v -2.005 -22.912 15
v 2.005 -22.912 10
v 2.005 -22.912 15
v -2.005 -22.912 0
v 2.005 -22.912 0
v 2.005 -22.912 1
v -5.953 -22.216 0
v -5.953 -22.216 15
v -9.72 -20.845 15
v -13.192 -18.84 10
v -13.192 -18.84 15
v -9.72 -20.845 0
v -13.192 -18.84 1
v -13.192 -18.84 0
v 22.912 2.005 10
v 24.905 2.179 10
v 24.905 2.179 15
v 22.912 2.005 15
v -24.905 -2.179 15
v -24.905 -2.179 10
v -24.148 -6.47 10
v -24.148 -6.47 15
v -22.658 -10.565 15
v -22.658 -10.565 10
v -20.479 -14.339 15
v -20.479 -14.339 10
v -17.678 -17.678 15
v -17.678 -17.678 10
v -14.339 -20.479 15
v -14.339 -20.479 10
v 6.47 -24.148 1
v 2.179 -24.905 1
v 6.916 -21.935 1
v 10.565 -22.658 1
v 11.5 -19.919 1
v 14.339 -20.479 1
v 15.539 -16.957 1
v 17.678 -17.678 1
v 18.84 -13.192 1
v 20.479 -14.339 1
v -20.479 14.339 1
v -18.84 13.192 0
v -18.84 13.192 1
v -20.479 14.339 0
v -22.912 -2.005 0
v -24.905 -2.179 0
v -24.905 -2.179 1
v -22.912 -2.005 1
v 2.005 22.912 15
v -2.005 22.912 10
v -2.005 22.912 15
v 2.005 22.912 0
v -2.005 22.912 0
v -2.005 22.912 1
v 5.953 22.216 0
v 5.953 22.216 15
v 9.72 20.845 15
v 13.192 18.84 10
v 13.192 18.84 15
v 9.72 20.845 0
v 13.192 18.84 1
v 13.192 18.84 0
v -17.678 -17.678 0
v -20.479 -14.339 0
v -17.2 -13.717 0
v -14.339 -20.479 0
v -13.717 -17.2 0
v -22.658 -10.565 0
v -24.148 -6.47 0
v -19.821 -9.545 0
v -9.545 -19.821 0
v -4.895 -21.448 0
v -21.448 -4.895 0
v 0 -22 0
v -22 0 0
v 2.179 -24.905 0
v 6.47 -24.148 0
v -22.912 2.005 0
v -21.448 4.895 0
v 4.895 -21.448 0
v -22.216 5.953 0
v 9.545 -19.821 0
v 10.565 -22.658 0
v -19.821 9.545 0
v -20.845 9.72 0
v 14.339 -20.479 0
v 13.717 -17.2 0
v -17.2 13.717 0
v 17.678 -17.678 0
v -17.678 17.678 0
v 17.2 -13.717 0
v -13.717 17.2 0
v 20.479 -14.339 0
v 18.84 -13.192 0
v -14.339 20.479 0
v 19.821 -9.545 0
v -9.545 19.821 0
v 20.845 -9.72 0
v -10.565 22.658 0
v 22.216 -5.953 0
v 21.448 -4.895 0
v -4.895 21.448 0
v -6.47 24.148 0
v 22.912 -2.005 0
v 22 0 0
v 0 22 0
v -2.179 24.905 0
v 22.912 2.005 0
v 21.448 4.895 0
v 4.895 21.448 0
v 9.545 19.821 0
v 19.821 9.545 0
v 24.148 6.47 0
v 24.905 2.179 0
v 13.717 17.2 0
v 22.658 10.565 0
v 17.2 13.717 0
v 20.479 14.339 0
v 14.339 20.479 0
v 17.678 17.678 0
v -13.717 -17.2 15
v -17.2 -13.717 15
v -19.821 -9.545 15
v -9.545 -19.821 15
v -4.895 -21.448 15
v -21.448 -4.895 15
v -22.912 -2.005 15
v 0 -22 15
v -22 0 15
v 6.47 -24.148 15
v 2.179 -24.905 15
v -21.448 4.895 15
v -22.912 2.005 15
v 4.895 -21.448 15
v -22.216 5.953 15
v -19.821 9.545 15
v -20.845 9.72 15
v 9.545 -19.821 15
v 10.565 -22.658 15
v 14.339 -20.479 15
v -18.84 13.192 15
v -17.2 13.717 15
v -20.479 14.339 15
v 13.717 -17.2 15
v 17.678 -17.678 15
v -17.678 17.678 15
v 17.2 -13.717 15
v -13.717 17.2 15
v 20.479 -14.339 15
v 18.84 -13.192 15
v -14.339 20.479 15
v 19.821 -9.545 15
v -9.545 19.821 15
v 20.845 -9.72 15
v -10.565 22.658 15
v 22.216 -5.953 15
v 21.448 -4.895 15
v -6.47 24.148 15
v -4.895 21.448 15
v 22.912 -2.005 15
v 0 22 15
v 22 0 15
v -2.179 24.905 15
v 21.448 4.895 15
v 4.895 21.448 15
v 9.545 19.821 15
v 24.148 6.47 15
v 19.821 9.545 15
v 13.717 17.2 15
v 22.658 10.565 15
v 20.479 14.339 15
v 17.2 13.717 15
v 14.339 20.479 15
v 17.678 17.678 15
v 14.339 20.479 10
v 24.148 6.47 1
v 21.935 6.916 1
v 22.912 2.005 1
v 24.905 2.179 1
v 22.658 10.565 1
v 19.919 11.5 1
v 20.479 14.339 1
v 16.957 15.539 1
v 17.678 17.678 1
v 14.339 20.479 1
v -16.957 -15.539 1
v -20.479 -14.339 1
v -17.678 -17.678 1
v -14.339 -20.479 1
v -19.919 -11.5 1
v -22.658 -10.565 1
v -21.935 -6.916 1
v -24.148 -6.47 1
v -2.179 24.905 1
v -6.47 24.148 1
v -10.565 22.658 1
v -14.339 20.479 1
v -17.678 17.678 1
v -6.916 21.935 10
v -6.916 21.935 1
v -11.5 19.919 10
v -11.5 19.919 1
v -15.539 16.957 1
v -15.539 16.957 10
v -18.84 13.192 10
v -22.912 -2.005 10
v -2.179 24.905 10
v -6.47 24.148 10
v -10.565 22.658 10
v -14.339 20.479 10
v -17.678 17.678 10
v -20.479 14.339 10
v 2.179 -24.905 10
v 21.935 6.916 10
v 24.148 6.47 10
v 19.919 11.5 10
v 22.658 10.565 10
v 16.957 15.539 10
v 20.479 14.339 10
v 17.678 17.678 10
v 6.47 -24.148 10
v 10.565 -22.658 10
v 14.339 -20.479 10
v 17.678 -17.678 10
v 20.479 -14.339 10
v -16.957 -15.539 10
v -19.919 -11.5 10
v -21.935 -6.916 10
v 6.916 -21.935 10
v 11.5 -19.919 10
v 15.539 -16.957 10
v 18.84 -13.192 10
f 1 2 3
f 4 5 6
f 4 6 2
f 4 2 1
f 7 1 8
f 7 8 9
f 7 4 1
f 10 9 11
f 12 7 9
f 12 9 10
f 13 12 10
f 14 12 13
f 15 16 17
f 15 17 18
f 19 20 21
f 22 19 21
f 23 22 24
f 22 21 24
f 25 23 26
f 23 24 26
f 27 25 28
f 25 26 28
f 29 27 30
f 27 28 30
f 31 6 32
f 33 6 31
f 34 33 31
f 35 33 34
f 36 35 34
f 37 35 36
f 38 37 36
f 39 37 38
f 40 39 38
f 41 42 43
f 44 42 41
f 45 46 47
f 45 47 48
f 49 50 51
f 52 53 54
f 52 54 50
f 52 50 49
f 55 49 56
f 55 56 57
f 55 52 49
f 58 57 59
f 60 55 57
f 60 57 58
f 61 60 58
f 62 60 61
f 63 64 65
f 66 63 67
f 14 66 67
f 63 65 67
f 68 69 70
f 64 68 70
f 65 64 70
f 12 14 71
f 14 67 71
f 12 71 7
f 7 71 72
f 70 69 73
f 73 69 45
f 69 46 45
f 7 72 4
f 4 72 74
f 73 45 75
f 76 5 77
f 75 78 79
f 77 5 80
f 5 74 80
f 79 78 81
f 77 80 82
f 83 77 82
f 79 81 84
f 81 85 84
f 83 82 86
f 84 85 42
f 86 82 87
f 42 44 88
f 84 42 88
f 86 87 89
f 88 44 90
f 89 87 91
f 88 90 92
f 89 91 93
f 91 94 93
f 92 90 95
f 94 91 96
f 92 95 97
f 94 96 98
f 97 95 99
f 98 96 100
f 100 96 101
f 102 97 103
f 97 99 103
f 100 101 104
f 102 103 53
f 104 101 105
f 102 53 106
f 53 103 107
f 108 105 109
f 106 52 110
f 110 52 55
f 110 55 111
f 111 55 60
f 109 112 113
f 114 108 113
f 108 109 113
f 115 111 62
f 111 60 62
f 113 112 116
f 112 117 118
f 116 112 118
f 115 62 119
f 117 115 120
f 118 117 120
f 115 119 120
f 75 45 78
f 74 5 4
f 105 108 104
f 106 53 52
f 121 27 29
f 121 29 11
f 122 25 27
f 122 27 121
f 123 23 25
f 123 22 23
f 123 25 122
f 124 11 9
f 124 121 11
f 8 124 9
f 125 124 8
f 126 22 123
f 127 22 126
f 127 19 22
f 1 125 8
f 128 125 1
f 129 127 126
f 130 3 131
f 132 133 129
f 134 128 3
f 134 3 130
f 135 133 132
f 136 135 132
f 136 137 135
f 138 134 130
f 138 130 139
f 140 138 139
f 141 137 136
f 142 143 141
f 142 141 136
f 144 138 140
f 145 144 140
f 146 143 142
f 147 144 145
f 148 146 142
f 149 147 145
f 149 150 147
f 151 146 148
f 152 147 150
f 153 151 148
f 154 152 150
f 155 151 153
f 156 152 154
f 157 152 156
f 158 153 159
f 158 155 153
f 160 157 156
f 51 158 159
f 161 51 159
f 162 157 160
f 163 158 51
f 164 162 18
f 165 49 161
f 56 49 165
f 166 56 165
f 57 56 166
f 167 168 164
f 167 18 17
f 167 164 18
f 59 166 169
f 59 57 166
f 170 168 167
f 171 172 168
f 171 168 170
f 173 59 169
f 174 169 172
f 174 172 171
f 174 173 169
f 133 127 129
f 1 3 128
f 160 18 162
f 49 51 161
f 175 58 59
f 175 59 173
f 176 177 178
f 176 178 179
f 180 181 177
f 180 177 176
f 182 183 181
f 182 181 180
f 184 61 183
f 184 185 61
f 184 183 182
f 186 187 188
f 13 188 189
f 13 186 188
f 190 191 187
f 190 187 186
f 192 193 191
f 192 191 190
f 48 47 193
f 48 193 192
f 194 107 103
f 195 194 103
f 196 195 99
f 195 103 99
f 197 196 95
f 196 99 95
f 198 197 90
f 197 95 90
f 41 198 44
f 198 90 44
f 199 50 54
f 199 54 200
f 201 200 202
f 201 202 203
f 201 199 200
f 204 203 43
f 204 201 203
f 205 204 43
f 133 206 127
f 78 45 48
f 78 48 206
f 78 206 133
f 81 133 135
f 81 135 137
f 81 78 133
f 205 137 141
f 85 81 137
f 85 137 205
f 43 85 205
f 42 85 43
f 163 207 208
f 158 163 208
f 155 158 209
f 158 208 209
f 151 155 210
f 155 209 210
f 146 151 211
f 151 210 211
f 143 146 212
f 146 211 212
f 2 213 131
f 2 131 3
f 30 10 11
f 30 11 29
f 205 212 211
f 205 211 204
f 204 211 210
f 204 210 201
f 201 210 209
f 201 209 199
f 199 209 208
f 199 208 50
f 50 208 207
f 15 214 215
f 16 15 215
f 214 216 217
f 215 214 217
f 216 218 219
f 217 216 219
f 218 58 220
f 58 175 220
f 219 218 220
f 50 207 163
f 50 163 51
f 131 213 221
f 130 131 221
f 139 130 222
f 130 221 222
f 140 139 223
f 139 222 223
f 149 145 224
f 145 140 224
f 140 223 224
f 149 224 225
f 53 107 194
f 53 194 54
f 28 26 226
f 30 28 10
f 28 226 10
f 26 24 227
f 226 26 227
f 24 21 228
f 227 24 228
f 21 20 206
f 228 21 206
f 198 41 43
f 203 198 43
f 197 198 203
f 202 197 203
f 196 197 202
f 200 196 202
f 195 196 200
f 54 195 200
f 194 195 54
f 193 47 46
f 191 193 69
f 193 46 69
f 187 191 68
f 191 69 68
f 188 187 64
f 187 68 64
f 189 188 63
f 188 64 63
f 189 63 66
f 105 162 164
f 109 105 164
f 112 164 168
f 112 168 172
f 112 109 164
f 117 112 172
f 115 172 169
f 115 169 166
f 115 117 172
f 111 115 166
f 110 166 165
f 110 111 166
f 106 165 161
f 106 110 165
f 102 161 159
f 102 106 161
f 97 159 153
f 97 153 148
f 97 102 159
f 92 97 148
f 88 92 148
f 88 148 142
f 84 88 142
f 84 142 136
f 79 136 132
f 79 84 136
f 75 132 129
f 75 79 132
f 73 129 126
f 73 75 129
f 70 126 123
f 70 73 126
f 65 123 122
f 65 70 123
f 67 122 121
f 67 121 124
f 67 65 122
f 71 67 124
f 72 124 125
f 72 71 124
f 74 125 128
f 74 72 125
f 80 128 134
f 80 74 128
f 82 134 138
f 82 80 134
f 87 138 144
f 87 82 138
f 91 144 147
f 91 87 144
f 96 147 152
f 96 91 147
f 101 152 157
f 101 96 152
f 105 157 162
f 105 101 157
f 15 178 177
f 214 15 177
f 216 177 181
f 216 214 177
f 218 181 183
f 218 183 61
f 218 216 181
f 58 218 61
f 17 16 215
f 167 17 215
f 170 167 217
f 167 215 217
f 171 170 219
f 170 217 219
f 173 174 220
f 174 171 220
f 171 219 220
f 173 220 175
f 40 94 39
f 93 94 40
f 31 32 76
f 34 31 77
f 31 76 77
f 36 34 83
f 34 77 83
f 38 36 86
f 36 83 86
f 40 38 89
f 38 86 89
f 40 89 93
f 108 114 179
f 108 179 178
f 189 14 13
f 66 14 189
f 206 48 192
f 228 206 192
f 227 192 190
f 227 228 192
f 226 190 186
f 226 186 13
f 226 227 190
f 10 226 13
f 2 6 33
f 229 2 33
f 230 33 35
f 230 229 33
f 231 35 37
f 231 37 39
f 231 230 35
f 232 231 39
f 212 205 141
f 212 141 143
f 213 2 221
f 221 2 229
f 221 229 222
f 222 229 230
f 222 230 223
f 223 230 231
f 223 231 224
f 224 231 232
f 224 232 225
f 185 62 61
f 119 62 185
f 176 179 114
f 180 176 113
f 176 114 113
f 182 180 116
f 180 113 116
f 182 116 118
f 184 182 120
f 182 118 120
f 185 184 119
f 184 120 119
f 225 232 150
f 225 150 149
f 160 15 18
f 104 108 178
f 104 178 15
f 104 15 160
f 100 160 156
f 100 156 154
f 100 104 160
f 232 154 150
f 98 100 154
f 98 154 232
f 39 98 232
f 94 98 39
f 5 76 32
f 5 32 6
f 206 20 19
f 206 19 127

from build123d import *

# Parameters (mm, degrees)
F0_R            = 25
F0_R_2          = 22
F1_DEPTH        = 15
F3_DEPTH        = 15
F3_COPIES_COUNT = 4
F5_R            = 38.565863123
F5_R_2          = 23
F6_DEPTH        = 2.5
F7_R            = 30.9780307995
F7_R_2          = 23
F8_DEPTH        = 4


# Not quite as in the source:
# - a pattern or mirror of a feature is missing from the dataset's text; its kind, count and spacing are read off the source's solid


with BuildPart() as f1:
    # F0 (on Top) → F1 (new body)
    with BuildSketch(Plane.XY):
        Circle(F0_R)
        Circle(F0_R_2, mode=Mode.SUBTRACT)
    extrude(amount=F1_DEPTH)

    # F2 (on Top) → F3 (cut, through all)
    with BuildSketch(Plane.XY):
        with BuildLine():
            Line((13.1922580361, 18.8404970186), (14.3394109088, 20.4788011072))
            ThreePointArc((14.3394109088, 20.4788011072), (6.4704761276, 24.1481456572), (-2.1788935687, 24.9048674523))
            Line((-2.1788935687, 24.9048674523), (-2.0045820832, 22.9124780561))
            ThreePointArc((-2.0045820832, 22.9124780561), (5.9528380374, 22.2162940046), (13.1922580361, 18.8404970186))
        make_face()
    f3 = extrude(amount=F3_DEPTH, mode=Mode.SUBTRACT)

    # F3_copies: F3 ×4 about axis
    f3_copies_axis = Axis((0, 0, 0), (0, 0, 1))
    for i in range(1, F3_COPIES_COUNT):
        add(f3.rotate(f3_copies_axis, i * 360 / F3_COPIES_COUNT), mode=Mode.SUBTRACT)

    # F5 (on offset) → F6 (cut, symmetric)
    with BuildSketch(Plane.XY.offset(7.5)):
        Circle(F5_R)
        Circle(F5_R_2, mode=Mode.SUBTRACT)
    extrude(amount=F6_DEPTH, both=True, mode=Mode.SUBTRACT)

    # F7 (on face) → F8 (cut)
    with BuildSketch(Plane.XY.offset(5)):
        Circle(F7_R)
        Circle(F7_R_2, mode=Mode.SUBTRACT)
    extrude(amount=-F8_DEPTH, mode=Mode.SUBTRACT)


solid = f1.part
